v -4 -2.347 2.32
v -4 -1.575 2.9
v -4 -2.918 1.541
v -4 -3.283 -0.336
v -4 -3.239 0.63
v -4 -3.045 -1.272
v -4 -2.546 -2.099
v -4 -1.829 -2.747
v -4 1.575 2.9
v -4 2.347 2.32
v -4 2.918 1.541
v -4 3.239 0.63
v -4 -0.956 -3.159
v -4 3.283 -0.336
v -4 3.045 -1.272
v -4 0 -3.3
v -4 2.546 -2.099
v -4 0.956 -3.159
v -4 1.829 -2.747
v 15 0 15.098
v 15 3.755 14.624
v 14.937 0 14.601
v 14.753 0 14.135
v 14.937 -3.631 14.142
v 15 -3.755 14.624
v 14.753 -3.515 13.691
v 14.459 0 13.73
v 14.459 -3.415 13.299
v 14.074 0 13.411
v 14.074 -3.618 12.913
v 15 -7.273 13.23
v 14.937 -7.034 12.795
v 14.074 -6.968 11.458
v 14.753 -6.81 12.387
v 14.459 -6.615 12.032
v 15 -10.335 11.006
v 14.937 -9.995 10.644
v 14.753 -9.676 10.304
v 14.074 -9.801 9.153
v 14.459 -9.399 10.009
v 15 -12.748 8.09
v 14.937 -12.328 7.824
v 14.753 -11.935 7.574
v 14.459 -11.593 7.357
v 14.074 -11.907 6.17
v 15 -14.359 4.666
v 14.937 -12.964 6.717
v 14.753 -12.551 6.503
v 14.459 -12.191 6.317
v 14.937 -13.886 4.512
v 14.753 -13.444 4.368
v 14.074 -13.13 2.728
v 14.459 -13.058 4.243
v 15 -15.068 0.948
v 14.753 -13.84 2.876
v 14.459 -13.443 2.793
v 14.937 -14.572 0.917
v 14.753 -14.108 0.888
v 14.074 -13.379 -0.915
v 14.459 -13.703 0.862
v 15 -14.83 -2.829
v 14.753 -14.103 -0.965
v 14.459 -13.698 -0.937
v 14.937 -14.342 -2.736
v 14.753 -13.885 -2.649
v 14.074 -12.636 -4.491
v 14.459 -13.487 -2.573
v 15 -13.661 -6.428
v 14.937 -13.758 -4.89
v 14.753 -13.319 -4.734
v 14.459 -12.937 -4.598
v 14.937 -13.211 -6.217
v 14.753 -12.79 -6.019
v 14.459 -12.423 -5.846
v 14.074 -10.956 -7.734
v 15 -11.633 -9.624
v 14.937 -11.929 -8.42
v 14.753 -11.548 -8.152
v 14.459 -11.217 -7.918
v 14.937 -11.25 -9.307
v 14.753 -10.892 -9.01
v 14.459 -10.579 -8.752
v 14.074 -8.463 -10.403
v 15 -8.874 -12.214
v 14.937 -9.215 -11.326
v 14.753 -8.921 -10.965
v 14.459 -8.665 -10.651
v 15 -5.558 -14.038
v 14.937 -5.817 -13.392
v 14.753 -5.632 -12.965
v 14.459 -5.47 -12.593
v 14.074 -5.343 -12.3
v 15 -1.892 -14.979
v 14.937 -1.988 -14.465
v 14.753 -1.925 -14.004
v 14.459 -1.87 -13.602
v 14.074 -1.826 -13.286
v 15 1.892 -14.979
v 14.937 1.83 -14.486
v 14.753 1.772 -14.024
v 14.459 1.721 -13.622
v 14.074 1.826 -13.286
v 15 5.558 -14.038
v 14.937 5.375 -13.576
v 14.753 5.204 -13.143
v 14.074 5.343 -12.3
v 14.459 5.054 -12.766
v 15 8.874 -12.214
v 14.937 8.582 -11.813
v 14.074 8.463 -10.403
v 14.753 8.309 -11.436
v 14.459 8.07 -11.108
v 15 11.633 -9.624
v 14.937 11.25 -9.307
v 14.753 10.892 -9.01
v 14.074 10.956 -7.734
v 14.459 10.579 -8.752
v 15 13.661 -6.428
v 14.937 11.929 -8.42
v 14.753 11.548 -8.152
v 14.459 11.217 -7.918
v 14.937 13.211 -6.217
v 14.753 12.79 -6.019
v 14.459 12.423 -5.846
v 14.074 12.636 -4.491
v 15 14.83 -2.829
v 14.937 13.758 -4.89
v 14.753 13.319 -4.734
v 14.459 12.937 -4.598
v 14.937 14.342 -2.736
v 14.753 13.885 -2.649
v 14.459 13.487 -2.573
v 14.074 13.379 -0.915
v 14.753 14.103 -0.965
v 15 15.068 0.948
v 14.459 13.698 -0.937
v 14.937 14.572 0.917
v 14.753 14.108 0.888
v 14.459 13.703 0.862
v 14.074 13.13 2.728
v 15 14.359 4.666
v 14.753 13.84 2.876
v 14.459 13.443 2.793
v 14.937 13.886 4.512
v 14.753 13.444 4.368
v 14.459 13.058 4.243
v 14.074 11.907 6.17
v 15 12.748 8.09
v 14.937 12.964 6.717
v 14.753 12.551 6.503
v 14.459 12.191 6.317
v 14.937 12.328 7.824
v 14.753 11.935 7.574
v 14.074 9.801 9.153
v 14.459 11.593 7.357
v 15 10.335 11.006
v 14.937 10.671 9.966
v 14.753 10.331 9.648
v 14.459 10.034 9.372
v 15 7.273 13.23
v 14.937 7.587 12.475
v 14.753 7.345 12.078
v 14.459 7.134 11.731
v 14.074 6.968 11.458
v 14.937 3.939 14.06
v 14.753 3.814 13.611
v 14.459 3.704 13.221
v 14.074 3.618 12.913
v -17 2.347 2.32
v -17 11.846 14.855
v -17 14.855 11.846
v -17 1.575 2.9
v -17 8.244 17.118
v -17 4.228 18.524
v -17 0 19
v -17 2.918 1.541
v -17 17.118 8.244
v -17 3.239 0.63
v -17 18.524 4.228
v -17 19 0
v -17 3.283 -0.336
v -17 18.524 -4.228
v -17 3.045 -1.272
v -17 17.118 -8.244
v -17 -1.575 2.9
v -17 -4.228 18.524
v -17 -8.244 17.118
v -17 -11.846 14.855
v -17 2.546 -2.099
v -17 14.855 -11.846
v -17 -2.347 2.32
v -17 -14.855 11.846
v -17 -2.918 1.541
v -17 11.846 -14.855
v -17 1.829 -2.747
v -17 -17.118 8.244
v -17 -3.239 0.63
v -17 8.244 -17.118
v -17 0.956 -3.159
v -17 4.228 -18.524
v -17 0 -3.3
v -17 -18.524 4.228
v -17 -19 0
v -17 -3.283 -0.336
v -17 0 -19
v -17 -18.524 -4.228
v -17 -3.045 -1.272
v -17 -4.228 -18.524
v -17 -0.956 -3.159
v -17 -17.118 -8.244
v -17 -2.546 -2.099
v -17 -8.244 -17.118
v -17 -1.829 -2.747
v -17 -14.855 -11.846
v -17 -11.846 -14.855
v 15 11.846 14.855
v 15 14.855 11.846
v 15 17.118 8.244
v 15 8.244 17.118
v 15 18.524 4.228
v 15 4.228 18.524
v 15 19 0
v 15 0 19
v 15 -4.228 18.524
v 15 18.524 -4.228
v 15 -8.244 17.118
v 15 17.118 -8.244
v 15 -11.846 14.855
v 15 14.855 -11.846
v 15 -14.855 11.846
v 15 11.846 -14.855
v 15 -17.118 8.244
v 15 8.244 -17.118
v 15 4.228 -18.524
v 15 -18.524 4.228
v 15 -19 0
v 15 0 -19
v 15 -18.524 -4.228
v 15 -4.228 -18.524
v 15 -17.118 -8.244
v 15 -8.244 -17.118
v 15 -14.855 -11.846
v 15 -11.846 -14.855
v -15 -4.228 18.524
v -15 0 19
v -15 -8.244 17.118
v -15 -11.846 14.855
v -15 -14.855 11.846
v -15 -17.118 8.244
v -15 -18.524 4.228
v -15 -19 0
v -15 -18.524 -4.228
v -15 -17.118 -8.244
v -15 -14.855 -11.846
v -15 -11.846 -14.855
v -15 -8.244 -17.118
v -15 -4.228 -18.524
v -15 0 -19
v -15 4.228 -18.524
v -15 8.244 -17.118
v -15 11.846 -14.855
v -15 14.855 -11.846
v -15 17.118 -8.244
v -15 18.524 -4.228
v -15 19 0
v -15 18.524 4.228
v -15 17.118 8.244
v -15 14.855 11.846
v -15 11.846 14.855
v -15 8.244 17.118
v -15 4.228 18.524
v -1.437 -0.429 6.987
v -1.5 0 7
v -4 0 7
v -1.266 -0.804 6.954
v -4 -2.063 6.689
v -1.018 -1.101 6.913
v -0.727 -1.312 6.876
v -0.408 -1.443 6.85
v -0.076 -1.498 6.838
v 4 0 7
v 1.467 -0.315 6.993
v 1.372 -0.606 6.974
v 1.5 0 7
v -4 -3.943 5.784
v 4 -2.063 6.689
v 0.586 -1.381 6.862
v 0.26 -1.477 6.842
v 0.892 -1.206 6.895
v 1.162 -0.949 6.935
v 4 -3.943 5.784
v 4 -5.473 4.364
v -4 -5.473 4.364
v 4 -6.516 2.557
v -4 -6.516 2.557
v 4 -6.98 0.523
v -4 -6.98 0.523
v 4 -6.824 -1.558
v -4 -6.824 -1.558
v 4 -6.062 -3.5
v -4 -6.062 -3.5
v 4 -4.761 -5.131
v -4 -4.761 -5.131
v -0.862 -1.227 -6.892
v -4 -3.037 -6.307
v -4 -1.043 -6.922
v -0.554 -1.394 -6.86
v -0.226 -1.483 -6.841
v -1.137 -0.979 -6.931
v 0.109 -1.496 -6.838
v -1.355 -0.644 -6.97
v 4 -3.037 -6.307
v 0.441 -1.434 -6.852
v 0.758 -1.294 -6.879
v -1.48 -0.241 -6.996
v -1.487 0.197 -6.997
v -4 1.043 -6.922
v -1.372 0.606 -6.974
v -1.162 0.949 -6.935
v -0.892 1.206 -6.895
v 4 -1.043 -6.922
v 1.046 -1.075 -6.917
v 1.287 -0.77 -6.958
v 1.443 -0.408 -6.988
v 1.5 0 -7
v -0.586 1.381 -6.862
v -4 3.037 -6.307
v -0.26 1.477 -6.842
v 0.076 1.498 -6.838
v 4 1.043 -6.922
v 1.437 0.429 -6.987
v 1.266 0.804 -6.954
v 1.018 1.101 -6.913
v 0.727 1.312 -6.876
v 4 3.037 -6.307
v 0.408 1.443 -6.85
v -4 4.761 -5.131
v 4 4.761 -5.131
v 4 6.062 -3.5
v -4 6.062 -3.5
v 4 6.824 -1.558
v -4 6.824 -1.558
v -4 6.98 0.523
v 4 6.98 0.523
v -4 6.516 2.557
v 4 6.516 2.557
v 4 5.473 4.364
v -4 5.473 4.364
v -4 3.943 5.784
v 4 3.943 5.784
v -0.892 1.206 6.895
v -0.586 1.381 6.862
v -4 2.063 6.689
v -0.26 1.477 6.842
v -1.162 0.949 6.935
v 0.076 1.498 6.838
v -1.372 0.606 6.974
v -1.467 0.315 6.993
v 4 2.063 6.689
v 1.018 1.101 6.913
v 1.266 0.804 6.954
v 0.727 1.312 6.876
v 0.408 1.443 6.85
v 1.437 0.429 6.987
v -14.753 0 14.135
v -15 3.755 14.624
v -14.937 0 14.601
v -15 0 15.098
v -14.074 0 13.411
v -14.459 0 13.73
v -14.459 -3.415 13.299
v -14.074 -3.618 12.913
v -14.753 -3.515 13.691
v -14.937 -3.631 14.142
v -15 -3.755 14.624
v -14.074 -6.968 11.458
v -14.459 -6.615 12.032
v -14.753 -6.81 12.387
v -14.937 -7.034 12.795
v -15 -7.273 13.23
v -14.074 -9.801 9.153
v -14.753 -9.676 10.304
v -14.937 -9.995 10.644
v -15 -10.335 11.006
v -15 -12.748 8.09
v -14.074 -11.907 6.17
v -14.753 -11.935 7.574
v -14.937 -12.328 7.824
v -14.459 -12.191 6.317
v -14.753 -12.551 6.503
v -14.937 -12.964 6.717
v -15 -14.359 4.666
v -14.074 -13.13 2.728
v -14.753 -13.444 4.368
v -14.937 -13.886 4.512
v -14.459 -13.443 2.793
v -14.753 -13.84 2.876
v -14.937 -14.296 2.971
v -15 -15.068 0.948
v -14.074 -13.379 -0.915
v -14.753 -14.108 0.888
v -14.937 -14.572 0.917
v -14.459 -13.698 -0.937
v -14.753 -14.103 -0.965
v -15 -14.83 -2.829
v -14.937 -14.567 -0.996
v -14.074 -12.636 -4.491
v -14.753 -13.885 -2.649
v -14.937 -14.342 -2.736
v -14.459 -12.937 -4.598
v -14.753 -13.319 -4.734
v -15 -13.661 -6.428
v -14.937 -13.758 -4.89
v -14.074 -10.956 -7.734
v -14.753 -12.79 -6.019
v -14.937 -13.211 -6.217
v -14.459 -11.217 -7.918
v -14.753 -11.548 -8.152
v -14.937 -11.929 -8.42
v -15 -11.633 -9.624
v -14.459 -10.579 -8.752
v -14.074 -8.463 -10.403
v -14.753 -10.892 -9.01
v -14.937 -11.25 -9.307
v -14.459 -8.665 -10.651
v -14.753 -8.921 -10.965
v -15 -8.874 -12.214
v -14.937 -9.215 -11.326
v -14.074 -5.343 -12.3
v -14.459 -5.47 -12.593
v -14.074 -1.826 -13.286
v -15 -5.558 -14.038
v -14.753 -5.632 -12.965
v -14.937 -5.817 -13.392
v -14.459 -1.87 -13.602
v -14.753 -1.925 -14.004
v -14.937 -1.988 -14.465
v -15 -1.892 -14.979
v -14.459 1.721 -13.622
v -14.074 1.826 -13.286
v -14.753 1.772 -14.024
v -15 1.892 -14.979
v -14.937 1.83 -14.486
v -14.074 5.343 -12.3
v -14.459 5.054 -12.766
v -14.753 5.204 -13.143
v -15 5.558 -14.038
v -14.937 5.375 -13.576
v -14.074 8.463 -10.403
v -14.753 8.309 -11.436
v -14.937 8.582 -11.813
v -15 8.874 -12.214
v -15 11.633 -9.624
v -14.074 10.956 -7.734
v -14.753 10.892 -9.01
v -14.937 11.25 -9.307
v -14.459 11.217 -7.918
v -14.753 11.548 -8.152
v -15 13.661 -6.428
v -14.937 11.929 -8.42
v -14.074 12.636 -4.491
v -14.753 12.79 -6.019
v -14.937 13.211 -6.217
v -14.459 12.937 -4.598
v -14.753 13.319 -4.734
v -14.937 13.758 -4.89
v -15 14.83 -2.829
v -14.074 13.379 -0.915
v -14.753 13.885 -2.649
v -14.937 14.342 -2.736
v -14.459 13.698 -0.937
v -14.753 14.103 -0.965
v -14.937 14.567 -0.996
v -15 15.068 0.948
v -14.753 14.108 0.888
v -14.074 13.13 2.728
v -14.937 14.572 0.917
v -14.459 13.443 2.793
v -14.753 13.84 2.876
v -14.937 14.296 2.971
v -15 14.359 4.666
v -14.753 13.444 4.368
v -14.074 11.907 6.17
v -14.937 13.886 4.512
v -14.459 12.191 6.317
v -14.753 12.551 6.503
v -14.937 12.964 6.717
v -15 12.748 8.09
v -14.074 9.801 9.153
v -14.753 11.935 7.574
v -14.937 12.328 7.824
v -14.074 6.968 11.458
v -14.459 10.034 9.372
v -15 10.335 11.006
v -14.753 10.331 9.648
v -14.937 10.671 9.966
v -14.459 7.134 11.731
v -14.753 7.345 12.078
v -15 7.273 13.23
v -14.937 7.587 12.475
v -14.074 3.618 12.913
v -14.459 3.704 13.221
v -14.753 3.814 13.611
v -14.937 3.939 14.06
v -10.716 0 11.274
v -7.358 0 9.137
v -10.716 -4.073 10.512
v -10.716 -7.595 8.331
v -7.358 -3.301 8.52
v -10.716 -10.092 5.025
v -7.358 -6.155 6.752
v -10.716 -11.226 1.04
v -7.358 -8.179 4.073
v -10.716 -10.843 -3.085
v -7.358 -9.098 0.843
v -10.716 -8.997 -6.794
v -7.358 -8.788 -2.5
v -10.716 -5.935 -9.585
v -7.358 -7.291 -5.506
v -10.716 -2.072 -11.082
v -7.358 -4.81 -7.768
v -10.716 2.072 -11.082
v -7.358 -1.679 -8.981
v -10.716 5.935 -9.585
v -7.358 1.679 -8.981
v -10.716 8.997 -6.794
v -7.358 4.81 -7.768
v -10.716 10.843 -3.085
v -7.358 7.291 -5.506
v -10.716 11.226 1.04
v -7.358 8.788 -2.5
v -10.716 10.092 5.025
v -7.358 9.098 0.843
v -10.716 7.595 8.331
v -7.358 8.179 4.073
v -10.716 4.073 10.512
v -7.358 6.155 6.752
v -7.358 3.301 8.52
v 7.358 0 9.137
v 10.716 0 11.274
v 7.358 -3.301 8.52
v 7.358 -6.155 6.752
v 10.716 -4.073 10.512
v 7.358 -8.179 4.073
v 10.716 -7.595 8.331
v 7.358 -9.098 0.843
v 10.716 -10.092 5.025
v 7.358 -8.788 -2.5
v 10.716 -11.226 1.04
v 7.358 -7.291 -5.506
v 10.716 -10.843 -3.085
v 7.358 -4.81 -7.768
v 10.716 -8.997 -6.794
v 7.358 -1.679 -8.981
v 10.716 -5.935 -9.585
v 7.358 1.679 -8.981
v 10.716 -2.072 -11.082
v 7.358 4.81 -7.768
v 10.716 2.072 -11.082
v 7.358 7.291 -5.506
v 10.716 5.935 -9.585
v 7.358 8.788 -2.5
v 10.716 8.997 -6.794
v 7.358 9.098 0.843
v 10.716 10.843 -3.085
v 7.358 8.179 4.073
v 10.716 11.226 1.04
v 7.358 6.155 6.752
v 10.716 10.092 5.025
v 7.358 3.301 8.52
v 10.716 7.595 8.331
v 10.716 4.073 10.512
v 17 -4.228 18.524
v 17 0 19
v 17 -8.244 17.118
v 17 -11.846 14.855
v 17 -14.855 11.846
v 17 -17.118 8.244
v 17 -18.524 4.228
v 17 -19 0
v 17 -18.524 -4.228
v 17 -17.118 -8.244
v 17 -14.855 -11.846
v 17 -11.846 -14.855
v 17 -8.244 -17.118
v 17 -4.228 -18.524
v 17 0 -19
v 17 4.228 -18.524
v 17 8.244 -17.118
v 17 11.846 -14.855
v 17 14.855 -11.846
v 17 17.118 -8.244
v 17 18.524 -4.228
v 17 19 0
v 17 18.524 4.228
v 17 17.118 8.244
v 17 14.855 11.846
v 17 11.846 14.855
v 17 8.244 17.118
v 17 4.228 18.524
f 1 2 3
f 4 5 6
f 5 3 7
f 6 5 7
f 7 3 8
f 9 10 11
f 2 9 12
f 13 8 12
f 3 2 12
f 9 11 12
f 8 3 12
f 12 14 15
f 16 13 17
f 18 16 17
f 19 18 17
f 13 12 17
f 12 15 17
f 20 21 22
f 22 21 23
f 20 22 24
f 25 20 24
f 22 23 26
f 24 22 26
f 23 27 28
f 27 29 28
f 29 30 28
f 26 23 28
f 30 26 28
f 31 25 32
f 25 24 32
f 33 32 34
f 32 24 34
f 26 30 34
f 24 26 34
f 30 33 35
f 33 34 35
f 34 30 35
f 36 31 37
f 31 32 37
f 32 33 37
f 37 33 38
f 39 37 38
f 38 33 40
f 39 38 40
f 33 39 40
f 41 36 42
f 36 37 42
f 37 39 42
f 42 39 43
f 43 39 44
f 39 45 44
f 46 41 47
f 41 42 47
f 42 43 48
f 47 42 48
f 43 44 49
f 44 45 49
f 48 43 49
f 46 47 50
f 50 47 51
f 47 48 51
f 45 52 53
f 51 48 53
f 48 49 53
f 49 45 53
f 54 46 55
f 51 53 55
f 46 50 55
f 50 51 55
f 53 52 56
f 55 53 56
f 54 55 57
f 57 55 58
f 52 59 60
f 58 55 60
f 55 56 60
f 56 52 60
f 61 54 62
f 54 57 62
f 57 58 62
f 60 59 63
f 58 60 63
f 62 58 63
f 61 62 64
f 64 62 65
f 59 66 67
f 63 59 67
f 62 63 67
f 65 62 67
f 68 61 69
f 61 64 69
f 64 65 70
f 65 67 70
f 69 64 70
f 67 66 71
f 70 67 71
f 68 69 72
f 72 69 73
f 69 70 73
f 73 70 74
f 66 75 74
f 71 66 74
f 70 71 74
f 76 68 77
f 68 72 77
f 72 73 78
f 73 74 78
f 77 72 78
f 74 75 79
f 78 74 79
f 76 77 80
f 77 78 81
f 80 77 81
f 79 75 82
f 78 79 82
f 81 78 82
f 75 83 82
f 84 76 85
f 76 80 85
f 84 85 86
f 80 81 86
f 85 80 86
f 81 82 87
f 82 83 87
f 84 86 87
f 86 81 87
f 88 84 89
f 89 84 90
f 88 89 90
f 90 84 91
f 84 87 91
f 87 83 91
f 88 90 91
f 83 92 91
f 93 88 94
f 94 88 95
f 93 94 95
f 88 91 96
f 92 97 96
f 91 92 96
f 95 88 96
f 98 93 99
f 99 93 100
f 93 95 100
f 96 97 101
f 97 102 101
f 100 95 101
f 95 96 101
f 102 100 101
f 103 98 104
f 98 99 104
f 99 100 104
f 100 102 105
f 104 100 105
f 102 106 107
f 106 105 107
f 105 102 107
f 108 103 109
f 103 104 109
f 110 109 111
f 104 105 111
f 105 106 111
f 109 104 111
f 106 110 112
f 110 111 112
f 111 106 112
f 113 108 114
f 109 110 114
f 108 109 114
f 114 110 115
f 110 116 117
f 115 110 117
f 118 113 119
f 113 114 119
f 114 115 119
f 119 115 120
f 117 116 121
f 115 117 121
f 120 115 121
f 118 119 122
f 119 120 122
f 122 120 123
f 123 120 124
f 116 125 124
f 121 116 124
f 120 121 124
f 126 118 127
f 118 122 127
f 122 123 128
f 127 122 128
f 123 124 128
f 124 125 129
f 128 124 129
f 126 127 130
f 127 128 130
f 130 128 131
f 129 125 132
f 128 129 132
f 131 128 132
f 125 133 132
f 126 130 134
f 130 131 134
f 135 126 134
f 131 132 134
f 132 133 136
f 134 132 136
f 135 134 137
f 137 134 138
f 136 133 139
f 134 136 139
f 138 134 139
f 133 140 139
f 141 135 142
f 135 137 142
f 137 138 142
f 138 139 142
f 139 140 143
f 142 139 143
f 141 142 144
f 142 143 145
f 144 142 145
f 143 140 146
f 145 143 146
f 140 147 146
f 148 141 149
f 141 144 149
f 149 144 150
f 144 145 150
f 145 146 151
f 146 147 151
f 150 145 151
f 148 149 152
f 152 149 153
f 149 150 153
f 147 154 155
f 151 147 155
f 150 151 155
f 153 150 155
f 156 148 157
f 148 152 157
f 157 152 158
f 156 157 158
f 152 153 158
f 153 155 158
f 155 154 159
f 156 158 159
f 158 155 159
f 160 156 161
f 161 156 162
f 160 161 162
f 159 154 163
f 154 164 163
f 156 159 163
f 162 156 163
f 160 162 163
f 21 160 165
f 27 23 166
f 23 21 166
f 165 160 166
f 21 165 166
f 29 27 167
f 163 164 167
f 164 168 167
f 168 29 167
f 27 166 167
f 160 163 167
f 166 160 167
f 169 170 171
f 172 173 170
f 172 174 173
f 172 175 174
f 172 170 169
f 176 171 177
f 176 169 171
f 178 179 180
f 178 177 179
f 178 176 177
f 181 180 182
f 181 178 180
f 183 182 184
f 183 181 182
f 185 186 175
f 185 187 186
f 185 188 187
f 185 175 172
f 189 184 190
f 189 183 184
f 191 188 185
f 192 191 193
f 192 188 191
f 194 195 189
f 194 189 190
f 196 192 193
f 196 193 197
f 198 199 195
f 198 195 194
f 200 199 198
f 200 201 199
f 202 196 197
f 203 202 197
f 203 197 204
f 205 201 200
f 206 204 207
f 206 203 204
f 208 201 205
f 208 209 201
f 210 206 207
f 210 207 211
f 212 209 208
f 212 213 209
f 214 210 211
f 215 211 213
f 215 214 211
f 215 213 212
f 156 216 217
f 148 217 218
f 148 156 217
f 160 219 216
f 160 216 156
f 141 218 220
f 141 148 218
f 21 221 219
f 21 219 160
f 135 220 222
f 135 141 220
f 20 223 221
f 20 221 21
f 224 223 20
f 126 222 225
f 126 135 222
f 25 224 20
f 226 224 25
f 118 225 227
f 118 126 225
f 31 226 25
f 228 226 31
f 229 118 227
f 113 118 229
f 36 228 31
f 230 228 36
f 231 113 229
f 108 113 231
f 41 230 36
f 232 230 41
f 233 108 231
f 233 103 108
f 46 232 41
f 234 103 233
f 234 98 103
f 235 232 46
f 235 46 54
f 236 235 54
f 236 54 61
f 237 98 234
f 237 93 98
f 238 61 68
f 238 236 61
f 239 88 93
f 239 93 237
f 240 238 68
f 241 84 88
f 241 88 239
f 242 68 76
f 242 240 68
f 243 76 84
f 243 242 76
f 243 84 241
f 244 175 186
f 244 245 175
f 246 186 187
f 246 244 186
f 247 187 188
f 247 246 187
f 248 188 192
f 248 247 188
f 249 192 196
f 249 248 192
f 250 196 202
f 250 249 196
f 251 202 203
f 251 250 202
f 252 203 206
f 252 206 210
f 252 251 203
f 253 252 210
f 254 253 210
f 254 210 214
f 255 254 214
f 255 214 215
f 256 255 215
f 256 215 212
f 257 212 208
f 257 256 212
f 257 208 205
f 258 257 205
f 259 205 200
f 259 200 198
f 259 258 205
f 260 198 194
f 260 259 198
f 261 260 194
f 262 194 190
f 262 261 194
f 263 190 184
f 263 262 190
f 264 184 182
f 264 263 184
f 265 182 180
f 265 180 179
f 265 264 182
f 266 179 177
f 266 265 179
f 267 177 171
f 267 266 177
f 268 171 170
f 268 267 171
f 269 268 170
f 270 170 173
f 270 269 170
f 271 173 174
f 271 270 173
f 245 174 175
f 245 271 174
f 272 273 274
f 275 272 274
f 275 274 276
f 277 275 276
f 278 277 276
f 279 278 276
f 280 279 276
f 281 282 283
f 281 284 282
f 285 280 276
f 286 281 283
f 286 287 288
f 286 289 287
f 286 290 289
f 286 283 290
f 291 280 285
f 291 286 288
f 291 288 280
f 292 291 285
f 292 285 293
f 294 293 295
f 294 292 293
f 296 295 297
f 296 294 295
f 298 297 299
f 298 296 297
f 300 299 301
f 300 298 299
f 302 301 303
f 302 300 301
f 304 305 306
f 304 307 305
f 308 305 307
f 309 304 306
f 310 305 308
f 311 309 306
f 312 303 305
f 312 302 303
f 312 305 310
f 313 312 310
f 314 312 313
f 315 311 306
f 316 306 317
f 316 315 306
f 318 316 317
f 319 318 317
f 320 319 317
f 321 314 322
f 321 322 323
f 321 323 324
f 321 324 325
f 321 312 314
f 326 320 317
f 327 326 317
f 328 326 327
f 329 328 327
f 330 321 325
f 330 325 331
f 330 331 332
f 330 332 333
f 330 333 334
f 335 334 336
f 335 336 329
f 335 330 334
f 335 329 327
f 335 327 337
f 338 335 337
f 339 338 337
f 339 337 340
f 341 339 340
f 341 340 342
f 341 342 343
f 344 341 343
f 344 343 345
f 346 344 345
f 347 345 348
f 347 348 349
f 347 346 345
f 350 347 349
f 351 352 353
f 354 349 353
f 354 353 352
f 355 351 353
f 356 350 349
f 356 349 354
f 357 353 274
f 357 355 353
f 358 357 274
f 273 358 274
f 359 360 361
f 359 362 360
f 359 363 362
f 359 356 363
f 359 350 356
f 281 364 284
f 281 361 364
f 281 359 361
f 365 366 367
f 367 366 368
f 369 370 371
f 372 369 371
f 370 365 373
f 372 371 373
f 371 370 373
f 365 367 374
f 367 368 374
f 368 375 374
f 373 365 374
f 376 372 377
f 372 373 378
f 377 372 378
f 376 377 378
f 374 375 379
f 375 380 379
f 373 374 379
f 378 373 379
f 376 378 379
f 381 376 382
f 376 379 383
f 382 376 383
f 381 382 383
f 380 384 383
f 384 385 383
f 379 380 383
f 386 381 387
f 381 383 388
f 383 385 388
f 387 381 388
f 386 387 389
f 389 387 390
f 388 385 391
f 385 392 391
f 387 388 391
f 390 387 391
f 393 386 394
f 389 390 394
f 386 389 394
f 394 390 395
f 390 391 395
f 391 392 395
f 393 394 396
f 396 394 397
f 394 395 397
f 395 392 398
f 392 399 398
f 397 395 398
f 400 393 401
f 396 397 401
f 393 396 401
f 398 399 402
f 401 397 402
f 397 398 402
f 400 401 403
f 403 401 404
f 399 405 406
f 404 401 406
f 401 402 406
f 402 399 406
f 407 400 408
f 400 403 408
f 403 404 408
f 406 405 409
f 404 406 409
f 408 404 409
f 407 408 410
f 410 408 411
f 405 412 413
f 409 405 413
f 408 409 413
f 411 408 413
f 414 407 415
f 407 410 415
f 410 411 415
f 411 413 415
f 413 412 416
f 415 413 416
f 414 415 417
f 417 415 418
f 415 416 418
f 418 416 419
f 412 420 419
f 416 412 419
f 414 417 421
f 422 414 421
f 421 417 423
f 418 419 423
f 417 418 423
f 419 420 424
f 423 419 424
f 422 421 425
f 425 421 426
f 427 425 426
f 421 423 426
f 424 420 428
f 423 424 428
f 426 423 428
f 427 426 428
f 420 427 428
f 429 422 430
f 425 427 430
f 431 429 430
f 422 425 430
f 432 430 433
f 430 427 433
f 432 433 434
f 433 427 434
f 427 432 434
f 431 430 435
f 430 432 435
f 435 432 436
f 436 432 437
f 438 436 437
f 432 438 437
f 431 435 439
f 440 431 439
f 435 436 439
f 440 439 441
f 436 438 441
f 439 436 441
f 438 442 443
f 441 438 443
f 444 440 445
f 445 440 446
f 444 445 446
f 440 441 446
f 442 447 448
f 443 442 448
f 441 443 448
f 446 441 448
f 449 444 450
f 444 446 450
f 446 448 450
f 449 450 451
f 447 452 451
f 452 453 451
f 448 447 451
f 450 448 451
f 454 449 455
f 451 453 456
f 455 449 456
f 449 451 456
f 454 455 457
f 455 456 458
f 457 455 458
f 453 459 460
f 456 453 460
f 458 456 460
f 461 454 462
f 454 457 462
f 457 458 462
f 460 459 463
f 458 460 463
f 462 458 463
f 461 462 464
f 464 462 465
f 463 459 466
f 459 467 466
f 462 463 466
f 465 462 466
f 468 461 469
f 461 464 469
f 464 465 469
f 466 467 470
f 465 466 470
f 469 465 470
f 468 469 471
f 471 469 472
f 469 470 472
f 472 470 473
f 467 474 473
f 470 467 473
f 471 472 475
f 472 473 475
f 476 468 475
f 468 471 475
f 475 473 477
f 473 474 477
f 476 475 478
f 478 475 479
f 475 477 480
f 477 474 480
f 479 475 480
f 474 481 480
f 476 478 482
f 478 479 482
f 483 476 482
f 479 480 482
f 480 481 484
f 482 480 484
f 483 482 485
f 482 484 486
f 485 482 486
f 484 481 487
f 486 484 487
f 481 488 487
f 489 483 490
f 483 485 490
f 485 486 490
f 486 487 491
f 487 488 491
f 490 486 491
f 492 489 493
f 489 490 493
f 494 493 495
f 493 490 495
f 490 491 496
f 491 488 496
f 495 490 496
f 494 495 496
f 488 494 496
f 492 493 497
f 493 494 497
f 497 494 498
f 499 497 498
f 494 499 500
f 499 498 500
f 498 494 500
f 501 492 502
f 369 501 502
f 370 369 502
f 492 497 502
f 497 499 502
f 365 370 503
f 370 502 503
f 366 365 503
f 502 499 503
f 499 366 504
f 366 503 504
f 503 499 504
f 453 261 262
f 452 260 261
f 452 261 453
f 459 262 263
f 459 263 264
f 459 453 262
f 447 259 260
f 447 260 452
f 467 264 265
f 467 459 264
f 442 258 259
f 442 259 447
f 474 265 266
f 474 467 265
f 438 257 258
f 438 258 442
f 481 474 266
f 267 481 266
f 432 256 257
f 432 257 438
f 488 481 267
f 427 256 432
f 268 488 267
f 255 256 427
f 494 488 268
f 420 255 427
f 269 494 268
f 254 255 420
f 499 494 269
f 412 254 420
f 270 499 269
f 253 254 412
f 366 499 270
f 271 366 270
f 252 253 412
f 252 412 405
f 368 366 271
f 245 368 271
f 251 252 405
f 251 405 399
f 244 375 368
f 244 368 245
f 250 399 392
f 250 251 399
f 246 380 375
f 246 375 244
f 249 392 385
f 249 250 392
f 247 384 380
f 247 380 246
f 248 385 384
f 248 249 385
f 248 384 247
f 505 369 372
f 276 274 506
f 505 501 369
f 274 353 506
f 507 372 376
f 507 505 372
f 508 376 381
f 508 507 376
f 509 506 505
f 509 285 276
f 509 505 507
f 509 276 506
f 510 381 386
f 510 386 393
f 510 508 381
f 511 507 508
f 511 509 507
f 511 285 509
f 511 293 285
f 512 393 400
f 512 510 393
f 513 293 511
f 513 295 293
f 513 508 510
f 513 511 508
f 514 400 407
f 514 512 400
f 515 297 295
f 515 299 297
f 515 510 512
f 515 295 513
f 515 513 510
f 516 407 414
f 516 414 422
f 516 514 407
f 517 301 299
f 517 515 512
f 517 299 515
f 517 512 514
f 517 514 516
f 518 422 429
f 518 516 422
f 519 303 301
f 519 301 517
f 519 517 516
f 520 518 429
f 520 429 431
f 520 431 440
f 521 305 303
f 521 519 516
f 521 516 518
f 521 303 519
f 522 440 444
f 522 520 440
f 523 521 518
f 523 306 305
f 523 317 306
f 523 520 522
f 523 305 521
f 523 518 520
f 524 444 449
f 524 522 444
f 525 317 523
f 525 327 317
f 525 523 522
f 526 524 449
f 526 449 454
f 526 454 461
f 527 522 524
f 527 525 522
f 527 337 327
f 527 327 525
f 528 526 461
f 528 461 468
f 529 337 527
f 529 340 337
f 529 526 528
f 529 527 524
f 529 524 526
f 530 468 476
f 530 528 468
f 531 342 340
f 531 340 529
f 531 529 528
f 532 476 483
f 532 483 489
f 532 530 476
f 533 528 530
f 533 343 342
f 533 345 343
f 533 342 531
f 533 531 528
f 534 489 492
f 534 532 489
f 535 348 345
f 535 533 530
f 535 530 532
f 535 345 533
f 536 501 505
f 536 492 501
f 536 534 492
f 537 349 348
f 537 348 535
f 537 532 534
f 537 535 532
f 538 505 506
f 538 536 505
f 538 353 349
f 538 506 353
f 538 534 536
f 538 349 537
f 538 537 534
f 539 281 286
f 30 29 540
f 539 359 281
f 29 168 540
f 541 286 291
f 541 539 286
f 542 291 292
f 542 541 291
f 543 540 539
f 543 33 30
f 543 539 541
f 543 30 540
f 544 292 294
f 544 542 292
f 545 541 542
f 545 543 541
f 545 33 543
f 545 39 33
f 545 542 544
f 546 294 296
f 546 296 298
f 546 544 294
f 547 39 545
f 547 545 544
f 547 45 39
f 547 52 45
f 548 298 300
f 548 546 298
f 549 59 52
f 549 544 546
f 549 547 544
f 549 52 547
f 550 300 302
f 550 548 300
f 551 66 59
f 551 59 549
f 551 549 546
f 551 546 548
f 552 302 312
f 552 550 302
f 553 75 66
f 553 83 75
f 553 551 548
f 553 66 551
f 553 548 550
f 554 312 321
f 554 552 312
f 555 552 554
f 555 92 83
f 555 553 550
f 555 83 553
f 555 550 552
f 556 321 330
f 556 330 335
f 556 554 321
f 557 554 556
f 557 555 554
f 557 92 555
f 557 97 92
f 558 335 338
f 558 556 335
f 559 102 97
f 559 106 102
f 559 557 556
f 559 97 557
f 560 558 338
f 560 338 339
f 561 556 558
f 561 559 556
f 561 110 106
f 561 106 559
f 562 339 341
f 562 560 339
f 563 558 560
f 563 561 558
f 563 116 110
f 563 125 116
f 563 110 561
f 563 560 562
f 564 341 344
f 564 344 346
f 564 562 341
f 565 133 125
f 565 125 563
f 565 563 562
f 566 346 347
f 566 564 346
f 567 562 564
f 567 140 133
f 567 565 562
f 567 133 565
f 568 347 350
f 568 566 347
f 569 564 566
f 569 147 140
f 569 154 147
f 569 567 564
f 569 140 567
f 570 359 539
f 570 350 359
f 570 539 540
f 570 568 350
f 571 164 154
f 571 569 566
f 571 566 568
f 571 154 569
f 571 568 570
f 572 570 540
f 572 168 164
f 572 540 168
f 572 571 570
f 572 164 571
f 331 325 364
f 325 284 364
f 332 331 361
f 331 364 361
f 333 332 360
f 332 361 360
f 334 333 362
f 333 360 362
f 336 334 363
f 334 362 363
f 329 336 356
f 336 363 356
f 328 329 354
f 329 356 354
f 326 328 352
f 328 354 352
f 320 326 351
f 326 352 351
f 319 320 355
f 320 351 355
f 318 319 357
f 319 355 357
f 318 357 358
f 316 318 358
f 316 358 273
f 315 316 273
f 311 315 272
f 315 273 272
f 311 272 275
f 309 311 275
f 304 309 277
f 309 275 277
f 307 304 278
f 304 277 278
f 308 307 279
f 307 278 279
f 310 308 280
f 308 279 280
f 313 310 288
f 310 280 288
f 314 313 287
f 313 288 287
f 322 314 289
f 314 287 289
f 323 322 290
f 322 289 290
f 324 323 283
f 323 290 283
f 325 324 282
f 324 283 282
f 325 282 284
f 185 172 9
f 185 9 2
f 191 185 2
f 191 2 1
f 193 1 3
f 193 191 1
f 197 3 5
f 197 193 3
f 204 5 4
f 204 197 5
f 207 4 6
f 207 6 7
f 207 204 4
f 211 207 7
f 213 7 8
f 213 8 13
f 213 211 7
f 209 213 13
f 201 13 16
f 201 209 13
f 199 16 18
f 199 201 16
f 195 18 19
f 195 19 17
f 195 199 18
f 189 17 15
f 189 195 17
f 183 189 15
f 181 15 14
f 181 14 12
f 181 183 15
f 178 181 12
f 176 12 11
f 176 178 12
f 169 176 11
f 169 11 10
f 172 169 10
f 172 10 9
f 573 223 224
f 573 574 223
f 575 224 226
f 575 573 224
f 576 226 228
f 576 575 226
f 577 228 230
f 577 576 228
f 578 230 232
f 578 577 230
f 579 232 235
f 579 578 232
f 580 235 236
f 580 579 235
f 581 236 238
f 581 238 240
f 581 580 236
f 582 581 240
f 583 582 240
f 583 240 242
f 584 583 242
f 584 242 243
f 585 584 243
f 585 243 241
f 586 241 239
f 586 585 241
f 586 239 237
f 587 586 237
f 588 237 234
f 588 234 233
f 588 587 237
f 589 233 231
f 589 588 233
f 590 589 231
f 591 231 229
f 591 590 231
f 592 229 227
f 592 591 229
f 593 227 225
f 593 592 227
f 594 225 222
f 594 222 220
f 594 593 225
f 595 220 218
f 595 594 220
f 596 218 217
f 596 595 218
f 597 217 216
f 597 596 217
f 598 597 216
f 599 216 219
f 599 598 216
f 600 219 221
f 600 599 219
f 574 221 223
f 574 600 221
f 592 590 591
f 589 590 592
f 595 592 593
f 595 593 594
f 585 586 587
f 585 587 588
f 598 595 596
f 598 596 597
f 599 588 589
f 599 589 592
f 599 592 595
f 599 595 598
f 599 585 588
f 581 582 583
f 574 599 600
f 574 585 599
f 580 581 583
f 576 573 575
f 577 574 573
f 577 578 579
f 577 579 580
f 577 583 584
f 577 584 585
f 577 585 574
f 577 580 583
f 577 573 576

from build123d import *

# Parameters (mm, degrees)
MOTOR_SHAFT_DEPTH  = 13
SKETCH4_R          = 1.5
STRING_HOLES_DEPTH = 17.5
FILLET1_R          = 2


with BuildPart() as part:
    # Sketch2 → Revolve1 (revolve)
    with BuildSketch(Plane.XY, mode=Mode.PRIVATE) as revolve1_sk:
        Polygon((15, 14), (15, 19), (17, 19), (17, 0), (-17, 0), (-17, 19), (-15, 19), (-15, 14), (-4, 7), (4, 7), align=None)
    revolve(revolve1_sk.sketch.rotate(Axis((0, 0, 0), (1, 0, 0)), 90), axis=Axis((0, 0, 0), (1, 0, 0)))

    # Sketch3 → motor shaft (cut)
    with BuildSketch(Plane.ZY.offset(17)):
        with BuildLine():
            Line((2.9, 1.574801575), (2.9, -1.574801575))
            ThreePointArc((2.9, -1.574801575), (-3.3, 0), (2.9, 1.574801575))
        make_face()
    extrude(amount=-MOTOR_SHAFT_DEPTH, mode=Mode.SUBTRACT)

    # Sketch4 → string holes (cut, symmetric)
    with BuildSketch(Plane.XY):
        Circle(SKETCH4_R)
    extrude(amount=STRING_HOLES_DEPTH, both=True, mode=Mode.SUBTRACT)

    # Fillet1
    fillet1_edges = [part.edges().sort_by_distance(p)[0] for p in [
        (15, 0, -14),
        (-15, 0, -14),
    ]]
    fillet(fillet1_edges, radius=FILLET1_R)


solid = part.part
